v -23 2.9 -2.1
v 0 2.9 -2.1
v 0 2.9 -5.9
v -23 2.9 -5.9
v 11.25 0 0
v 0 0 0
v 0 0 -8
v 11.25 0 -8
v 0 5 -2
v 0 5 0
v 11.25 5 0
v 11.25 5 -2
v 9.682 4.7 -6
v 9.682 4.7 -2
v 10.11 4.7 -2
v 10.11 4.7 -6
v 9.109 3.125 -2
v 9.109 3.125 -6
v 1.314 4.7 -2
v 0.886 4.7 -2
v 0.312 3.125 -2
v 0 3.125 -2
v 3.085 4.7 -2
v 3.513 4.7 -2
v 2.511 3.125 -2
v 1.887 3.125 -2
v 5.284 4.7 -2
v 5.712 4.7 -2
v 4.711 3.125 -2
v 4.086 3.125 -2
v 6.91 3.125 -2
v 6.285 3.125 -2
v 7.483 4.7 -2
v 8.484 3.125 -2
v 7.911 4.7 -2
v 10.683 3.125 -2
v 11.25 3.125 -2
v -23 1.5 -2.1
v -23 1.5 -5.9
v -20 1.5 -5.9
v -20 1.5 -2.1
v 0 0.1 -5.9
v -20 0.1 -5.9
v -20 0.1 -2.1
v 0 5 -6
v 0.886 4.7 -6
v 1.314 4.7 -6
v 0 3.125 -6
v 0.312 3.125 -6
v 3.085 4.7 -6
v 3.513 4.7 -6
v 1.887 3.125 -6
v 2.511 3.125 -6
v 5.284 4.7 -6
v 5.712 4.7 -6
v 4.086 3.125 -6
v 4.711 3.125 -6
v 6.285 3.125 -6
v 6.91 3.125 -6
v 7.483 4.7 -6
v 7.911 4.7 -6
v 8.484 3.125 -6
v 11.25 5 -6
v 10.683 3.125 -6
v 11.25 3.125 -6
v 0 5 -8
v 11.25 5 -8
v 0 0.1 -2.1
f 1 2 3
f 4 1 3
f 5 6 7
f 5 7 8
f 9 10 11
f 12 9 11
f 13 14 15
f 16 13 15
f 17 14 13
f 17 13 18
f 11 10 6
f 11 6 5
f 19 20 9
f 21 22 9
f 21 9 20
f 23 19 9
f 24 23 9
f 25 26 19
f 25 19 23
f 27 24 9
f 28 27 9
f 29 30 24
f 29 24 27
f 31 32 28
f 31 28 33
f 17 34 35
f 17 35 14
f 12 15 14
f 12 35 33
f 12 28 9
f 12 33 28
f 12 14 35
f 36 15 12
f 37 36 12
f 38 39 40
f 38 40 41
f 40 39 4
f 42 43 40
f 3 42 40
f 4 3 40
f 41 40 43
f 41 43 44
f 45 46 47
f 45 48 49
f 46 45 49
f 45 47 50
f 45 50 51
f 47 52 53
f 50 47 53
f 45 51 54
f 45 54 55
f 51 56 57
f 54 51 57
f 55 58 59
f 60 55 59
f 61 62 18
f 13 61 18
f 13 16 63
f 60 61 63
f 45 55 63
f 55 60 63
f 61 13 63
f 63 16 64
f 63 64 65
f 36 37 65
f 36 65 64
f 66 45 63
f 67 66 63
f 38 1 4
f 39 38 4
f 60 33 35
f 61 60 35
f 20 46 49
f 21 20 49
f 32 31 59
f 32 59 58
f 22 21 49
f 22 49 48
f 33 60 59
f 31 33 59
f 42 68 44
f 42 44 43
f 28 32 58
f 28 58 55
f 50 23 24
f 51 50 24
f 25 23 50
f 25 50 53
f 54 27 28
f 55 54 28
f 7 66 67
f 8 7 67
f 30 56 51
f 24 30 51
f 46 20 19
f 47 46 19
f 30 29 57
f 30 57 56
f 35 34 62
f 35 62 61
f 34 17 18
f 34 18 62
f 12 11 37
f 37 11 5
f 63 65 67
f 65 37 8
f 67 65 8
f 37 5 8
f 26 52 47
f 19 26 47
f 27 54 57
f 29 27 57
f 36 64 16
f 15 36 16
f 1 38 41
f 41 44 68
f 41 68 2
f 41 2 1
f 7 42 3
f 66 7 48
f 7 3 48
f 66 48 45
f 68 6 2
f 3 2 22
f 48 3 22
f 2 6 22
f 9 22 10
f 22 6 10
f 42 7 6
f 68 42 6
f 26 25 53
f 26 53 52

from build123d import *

# Parameters (mm, degrees)
BLANKSKE_W          = 12
BLANKSKE_H          = 4.7
BLANK_DEPTH         = 8
TOOTHCUTSIM_DEPTH   = 16.16871781
TEETHCUTS_COUNT     = 6
TEETHCUTS_PITCH     = 2.199114855
SKETCH1_W           = 12
SKETCH1_H           = 2
BOSS_EXTRUDE1_DEPTH = 5
SKETCH2_W           = 0.75
SKETCH2_H           = 8
CUT_EXTRUDE1_DEPTH  = 5
SKETCH3_W           = 3.8
SKETCH3_H           = 2.8
BOSS_EXTRUDE2_DEPTH = 23
SKETCH4_W           = 3.8
SKETCH4_H           = 1.4
CUT_EXTRUDE2_DEPTH  = 3


with BuildPart() as part:
    # BlankSke → Blank (new body)
    with BuildSketch(Plane.XY):
        with Locations((6, 2.35)):
            Rectangle(BLANKSKE_W, BLANKSKE_H)
    extrude(amount=-BLANK_DEPTH)

    # TooCutSkeSim → ToothCutSim (cut, through all)
    with BuildSketch(Plane.XY):
        Polygon((0.312304759, 3.125), (-0.312304759, 3.125), (-0.894802722, 4.7254), (0.894802722, 4.7254), align=None)
    toothcutsim = extrude(amount=-TOOTHCUTSIM_DEPTH, mode=Mode.SUBTRACT)

    # TeethCuts: ToothCutSim ×6
    with Locations(*[(i * TEETHCUTS_PITCH, 0, 0) for i in range(1, TEETHCUTS_COUNT)]):
        add(toothcutsim, mode=Mode.SUBTRACT)

    # Sketch1 → Boss-Extrude1 (add)
    with BuildSketch(Plane.XZ):
        with Locations((6, -1)):
            Rectangle(SKETCH1_W, SKETCH1_H)
        with Locations((6, -7)):
            Rectangle(SKETCH1_W, SKETCH1_H)
    extrude(amount=-BOSS_EXTRUDE1_DEPTH)

    # Sketch2 → Cut-Extrude1 (cut)
    with BuildSketch(Plane(origin=(0, 0, 0), x_dir=(1, 0, 0), z_dir=(0, 1, 0))):
        with Locations((11.625, 4)):
            Rectangle(SKETCH2_W, SKETCH2_H)
    extrude(amount=CUT_EXTRUDE1_DEPTH, mode=Mode.SUBTRACT)

    # Sketch3 → Boss-Extrude2 (add)
    with BuildSketch(Plane(origin=(0, 0, 0), x_dir=(0, 0, -1), z_dir=(1, 0, 0))):
        with Locations((4, 1.5)):
            Rectangle(SKETCH3_W, SKETCH3_H)
    extrude(amount=-BOSS_EXTRUDE2_DEPTH)

    # Sketch4 → Cut-Extrude2 (cut)
    with BuildSketch(Plane.ZY.offset(23)):
        with Locations((-4, 0.8)):
            Rectangle(SKETCH4_W, SKETCH4_H)
    extrude(amount=-CUT_EXTRUDE2_DEPTH, mode=Mode.SUBTRACT)


solid = part.part
